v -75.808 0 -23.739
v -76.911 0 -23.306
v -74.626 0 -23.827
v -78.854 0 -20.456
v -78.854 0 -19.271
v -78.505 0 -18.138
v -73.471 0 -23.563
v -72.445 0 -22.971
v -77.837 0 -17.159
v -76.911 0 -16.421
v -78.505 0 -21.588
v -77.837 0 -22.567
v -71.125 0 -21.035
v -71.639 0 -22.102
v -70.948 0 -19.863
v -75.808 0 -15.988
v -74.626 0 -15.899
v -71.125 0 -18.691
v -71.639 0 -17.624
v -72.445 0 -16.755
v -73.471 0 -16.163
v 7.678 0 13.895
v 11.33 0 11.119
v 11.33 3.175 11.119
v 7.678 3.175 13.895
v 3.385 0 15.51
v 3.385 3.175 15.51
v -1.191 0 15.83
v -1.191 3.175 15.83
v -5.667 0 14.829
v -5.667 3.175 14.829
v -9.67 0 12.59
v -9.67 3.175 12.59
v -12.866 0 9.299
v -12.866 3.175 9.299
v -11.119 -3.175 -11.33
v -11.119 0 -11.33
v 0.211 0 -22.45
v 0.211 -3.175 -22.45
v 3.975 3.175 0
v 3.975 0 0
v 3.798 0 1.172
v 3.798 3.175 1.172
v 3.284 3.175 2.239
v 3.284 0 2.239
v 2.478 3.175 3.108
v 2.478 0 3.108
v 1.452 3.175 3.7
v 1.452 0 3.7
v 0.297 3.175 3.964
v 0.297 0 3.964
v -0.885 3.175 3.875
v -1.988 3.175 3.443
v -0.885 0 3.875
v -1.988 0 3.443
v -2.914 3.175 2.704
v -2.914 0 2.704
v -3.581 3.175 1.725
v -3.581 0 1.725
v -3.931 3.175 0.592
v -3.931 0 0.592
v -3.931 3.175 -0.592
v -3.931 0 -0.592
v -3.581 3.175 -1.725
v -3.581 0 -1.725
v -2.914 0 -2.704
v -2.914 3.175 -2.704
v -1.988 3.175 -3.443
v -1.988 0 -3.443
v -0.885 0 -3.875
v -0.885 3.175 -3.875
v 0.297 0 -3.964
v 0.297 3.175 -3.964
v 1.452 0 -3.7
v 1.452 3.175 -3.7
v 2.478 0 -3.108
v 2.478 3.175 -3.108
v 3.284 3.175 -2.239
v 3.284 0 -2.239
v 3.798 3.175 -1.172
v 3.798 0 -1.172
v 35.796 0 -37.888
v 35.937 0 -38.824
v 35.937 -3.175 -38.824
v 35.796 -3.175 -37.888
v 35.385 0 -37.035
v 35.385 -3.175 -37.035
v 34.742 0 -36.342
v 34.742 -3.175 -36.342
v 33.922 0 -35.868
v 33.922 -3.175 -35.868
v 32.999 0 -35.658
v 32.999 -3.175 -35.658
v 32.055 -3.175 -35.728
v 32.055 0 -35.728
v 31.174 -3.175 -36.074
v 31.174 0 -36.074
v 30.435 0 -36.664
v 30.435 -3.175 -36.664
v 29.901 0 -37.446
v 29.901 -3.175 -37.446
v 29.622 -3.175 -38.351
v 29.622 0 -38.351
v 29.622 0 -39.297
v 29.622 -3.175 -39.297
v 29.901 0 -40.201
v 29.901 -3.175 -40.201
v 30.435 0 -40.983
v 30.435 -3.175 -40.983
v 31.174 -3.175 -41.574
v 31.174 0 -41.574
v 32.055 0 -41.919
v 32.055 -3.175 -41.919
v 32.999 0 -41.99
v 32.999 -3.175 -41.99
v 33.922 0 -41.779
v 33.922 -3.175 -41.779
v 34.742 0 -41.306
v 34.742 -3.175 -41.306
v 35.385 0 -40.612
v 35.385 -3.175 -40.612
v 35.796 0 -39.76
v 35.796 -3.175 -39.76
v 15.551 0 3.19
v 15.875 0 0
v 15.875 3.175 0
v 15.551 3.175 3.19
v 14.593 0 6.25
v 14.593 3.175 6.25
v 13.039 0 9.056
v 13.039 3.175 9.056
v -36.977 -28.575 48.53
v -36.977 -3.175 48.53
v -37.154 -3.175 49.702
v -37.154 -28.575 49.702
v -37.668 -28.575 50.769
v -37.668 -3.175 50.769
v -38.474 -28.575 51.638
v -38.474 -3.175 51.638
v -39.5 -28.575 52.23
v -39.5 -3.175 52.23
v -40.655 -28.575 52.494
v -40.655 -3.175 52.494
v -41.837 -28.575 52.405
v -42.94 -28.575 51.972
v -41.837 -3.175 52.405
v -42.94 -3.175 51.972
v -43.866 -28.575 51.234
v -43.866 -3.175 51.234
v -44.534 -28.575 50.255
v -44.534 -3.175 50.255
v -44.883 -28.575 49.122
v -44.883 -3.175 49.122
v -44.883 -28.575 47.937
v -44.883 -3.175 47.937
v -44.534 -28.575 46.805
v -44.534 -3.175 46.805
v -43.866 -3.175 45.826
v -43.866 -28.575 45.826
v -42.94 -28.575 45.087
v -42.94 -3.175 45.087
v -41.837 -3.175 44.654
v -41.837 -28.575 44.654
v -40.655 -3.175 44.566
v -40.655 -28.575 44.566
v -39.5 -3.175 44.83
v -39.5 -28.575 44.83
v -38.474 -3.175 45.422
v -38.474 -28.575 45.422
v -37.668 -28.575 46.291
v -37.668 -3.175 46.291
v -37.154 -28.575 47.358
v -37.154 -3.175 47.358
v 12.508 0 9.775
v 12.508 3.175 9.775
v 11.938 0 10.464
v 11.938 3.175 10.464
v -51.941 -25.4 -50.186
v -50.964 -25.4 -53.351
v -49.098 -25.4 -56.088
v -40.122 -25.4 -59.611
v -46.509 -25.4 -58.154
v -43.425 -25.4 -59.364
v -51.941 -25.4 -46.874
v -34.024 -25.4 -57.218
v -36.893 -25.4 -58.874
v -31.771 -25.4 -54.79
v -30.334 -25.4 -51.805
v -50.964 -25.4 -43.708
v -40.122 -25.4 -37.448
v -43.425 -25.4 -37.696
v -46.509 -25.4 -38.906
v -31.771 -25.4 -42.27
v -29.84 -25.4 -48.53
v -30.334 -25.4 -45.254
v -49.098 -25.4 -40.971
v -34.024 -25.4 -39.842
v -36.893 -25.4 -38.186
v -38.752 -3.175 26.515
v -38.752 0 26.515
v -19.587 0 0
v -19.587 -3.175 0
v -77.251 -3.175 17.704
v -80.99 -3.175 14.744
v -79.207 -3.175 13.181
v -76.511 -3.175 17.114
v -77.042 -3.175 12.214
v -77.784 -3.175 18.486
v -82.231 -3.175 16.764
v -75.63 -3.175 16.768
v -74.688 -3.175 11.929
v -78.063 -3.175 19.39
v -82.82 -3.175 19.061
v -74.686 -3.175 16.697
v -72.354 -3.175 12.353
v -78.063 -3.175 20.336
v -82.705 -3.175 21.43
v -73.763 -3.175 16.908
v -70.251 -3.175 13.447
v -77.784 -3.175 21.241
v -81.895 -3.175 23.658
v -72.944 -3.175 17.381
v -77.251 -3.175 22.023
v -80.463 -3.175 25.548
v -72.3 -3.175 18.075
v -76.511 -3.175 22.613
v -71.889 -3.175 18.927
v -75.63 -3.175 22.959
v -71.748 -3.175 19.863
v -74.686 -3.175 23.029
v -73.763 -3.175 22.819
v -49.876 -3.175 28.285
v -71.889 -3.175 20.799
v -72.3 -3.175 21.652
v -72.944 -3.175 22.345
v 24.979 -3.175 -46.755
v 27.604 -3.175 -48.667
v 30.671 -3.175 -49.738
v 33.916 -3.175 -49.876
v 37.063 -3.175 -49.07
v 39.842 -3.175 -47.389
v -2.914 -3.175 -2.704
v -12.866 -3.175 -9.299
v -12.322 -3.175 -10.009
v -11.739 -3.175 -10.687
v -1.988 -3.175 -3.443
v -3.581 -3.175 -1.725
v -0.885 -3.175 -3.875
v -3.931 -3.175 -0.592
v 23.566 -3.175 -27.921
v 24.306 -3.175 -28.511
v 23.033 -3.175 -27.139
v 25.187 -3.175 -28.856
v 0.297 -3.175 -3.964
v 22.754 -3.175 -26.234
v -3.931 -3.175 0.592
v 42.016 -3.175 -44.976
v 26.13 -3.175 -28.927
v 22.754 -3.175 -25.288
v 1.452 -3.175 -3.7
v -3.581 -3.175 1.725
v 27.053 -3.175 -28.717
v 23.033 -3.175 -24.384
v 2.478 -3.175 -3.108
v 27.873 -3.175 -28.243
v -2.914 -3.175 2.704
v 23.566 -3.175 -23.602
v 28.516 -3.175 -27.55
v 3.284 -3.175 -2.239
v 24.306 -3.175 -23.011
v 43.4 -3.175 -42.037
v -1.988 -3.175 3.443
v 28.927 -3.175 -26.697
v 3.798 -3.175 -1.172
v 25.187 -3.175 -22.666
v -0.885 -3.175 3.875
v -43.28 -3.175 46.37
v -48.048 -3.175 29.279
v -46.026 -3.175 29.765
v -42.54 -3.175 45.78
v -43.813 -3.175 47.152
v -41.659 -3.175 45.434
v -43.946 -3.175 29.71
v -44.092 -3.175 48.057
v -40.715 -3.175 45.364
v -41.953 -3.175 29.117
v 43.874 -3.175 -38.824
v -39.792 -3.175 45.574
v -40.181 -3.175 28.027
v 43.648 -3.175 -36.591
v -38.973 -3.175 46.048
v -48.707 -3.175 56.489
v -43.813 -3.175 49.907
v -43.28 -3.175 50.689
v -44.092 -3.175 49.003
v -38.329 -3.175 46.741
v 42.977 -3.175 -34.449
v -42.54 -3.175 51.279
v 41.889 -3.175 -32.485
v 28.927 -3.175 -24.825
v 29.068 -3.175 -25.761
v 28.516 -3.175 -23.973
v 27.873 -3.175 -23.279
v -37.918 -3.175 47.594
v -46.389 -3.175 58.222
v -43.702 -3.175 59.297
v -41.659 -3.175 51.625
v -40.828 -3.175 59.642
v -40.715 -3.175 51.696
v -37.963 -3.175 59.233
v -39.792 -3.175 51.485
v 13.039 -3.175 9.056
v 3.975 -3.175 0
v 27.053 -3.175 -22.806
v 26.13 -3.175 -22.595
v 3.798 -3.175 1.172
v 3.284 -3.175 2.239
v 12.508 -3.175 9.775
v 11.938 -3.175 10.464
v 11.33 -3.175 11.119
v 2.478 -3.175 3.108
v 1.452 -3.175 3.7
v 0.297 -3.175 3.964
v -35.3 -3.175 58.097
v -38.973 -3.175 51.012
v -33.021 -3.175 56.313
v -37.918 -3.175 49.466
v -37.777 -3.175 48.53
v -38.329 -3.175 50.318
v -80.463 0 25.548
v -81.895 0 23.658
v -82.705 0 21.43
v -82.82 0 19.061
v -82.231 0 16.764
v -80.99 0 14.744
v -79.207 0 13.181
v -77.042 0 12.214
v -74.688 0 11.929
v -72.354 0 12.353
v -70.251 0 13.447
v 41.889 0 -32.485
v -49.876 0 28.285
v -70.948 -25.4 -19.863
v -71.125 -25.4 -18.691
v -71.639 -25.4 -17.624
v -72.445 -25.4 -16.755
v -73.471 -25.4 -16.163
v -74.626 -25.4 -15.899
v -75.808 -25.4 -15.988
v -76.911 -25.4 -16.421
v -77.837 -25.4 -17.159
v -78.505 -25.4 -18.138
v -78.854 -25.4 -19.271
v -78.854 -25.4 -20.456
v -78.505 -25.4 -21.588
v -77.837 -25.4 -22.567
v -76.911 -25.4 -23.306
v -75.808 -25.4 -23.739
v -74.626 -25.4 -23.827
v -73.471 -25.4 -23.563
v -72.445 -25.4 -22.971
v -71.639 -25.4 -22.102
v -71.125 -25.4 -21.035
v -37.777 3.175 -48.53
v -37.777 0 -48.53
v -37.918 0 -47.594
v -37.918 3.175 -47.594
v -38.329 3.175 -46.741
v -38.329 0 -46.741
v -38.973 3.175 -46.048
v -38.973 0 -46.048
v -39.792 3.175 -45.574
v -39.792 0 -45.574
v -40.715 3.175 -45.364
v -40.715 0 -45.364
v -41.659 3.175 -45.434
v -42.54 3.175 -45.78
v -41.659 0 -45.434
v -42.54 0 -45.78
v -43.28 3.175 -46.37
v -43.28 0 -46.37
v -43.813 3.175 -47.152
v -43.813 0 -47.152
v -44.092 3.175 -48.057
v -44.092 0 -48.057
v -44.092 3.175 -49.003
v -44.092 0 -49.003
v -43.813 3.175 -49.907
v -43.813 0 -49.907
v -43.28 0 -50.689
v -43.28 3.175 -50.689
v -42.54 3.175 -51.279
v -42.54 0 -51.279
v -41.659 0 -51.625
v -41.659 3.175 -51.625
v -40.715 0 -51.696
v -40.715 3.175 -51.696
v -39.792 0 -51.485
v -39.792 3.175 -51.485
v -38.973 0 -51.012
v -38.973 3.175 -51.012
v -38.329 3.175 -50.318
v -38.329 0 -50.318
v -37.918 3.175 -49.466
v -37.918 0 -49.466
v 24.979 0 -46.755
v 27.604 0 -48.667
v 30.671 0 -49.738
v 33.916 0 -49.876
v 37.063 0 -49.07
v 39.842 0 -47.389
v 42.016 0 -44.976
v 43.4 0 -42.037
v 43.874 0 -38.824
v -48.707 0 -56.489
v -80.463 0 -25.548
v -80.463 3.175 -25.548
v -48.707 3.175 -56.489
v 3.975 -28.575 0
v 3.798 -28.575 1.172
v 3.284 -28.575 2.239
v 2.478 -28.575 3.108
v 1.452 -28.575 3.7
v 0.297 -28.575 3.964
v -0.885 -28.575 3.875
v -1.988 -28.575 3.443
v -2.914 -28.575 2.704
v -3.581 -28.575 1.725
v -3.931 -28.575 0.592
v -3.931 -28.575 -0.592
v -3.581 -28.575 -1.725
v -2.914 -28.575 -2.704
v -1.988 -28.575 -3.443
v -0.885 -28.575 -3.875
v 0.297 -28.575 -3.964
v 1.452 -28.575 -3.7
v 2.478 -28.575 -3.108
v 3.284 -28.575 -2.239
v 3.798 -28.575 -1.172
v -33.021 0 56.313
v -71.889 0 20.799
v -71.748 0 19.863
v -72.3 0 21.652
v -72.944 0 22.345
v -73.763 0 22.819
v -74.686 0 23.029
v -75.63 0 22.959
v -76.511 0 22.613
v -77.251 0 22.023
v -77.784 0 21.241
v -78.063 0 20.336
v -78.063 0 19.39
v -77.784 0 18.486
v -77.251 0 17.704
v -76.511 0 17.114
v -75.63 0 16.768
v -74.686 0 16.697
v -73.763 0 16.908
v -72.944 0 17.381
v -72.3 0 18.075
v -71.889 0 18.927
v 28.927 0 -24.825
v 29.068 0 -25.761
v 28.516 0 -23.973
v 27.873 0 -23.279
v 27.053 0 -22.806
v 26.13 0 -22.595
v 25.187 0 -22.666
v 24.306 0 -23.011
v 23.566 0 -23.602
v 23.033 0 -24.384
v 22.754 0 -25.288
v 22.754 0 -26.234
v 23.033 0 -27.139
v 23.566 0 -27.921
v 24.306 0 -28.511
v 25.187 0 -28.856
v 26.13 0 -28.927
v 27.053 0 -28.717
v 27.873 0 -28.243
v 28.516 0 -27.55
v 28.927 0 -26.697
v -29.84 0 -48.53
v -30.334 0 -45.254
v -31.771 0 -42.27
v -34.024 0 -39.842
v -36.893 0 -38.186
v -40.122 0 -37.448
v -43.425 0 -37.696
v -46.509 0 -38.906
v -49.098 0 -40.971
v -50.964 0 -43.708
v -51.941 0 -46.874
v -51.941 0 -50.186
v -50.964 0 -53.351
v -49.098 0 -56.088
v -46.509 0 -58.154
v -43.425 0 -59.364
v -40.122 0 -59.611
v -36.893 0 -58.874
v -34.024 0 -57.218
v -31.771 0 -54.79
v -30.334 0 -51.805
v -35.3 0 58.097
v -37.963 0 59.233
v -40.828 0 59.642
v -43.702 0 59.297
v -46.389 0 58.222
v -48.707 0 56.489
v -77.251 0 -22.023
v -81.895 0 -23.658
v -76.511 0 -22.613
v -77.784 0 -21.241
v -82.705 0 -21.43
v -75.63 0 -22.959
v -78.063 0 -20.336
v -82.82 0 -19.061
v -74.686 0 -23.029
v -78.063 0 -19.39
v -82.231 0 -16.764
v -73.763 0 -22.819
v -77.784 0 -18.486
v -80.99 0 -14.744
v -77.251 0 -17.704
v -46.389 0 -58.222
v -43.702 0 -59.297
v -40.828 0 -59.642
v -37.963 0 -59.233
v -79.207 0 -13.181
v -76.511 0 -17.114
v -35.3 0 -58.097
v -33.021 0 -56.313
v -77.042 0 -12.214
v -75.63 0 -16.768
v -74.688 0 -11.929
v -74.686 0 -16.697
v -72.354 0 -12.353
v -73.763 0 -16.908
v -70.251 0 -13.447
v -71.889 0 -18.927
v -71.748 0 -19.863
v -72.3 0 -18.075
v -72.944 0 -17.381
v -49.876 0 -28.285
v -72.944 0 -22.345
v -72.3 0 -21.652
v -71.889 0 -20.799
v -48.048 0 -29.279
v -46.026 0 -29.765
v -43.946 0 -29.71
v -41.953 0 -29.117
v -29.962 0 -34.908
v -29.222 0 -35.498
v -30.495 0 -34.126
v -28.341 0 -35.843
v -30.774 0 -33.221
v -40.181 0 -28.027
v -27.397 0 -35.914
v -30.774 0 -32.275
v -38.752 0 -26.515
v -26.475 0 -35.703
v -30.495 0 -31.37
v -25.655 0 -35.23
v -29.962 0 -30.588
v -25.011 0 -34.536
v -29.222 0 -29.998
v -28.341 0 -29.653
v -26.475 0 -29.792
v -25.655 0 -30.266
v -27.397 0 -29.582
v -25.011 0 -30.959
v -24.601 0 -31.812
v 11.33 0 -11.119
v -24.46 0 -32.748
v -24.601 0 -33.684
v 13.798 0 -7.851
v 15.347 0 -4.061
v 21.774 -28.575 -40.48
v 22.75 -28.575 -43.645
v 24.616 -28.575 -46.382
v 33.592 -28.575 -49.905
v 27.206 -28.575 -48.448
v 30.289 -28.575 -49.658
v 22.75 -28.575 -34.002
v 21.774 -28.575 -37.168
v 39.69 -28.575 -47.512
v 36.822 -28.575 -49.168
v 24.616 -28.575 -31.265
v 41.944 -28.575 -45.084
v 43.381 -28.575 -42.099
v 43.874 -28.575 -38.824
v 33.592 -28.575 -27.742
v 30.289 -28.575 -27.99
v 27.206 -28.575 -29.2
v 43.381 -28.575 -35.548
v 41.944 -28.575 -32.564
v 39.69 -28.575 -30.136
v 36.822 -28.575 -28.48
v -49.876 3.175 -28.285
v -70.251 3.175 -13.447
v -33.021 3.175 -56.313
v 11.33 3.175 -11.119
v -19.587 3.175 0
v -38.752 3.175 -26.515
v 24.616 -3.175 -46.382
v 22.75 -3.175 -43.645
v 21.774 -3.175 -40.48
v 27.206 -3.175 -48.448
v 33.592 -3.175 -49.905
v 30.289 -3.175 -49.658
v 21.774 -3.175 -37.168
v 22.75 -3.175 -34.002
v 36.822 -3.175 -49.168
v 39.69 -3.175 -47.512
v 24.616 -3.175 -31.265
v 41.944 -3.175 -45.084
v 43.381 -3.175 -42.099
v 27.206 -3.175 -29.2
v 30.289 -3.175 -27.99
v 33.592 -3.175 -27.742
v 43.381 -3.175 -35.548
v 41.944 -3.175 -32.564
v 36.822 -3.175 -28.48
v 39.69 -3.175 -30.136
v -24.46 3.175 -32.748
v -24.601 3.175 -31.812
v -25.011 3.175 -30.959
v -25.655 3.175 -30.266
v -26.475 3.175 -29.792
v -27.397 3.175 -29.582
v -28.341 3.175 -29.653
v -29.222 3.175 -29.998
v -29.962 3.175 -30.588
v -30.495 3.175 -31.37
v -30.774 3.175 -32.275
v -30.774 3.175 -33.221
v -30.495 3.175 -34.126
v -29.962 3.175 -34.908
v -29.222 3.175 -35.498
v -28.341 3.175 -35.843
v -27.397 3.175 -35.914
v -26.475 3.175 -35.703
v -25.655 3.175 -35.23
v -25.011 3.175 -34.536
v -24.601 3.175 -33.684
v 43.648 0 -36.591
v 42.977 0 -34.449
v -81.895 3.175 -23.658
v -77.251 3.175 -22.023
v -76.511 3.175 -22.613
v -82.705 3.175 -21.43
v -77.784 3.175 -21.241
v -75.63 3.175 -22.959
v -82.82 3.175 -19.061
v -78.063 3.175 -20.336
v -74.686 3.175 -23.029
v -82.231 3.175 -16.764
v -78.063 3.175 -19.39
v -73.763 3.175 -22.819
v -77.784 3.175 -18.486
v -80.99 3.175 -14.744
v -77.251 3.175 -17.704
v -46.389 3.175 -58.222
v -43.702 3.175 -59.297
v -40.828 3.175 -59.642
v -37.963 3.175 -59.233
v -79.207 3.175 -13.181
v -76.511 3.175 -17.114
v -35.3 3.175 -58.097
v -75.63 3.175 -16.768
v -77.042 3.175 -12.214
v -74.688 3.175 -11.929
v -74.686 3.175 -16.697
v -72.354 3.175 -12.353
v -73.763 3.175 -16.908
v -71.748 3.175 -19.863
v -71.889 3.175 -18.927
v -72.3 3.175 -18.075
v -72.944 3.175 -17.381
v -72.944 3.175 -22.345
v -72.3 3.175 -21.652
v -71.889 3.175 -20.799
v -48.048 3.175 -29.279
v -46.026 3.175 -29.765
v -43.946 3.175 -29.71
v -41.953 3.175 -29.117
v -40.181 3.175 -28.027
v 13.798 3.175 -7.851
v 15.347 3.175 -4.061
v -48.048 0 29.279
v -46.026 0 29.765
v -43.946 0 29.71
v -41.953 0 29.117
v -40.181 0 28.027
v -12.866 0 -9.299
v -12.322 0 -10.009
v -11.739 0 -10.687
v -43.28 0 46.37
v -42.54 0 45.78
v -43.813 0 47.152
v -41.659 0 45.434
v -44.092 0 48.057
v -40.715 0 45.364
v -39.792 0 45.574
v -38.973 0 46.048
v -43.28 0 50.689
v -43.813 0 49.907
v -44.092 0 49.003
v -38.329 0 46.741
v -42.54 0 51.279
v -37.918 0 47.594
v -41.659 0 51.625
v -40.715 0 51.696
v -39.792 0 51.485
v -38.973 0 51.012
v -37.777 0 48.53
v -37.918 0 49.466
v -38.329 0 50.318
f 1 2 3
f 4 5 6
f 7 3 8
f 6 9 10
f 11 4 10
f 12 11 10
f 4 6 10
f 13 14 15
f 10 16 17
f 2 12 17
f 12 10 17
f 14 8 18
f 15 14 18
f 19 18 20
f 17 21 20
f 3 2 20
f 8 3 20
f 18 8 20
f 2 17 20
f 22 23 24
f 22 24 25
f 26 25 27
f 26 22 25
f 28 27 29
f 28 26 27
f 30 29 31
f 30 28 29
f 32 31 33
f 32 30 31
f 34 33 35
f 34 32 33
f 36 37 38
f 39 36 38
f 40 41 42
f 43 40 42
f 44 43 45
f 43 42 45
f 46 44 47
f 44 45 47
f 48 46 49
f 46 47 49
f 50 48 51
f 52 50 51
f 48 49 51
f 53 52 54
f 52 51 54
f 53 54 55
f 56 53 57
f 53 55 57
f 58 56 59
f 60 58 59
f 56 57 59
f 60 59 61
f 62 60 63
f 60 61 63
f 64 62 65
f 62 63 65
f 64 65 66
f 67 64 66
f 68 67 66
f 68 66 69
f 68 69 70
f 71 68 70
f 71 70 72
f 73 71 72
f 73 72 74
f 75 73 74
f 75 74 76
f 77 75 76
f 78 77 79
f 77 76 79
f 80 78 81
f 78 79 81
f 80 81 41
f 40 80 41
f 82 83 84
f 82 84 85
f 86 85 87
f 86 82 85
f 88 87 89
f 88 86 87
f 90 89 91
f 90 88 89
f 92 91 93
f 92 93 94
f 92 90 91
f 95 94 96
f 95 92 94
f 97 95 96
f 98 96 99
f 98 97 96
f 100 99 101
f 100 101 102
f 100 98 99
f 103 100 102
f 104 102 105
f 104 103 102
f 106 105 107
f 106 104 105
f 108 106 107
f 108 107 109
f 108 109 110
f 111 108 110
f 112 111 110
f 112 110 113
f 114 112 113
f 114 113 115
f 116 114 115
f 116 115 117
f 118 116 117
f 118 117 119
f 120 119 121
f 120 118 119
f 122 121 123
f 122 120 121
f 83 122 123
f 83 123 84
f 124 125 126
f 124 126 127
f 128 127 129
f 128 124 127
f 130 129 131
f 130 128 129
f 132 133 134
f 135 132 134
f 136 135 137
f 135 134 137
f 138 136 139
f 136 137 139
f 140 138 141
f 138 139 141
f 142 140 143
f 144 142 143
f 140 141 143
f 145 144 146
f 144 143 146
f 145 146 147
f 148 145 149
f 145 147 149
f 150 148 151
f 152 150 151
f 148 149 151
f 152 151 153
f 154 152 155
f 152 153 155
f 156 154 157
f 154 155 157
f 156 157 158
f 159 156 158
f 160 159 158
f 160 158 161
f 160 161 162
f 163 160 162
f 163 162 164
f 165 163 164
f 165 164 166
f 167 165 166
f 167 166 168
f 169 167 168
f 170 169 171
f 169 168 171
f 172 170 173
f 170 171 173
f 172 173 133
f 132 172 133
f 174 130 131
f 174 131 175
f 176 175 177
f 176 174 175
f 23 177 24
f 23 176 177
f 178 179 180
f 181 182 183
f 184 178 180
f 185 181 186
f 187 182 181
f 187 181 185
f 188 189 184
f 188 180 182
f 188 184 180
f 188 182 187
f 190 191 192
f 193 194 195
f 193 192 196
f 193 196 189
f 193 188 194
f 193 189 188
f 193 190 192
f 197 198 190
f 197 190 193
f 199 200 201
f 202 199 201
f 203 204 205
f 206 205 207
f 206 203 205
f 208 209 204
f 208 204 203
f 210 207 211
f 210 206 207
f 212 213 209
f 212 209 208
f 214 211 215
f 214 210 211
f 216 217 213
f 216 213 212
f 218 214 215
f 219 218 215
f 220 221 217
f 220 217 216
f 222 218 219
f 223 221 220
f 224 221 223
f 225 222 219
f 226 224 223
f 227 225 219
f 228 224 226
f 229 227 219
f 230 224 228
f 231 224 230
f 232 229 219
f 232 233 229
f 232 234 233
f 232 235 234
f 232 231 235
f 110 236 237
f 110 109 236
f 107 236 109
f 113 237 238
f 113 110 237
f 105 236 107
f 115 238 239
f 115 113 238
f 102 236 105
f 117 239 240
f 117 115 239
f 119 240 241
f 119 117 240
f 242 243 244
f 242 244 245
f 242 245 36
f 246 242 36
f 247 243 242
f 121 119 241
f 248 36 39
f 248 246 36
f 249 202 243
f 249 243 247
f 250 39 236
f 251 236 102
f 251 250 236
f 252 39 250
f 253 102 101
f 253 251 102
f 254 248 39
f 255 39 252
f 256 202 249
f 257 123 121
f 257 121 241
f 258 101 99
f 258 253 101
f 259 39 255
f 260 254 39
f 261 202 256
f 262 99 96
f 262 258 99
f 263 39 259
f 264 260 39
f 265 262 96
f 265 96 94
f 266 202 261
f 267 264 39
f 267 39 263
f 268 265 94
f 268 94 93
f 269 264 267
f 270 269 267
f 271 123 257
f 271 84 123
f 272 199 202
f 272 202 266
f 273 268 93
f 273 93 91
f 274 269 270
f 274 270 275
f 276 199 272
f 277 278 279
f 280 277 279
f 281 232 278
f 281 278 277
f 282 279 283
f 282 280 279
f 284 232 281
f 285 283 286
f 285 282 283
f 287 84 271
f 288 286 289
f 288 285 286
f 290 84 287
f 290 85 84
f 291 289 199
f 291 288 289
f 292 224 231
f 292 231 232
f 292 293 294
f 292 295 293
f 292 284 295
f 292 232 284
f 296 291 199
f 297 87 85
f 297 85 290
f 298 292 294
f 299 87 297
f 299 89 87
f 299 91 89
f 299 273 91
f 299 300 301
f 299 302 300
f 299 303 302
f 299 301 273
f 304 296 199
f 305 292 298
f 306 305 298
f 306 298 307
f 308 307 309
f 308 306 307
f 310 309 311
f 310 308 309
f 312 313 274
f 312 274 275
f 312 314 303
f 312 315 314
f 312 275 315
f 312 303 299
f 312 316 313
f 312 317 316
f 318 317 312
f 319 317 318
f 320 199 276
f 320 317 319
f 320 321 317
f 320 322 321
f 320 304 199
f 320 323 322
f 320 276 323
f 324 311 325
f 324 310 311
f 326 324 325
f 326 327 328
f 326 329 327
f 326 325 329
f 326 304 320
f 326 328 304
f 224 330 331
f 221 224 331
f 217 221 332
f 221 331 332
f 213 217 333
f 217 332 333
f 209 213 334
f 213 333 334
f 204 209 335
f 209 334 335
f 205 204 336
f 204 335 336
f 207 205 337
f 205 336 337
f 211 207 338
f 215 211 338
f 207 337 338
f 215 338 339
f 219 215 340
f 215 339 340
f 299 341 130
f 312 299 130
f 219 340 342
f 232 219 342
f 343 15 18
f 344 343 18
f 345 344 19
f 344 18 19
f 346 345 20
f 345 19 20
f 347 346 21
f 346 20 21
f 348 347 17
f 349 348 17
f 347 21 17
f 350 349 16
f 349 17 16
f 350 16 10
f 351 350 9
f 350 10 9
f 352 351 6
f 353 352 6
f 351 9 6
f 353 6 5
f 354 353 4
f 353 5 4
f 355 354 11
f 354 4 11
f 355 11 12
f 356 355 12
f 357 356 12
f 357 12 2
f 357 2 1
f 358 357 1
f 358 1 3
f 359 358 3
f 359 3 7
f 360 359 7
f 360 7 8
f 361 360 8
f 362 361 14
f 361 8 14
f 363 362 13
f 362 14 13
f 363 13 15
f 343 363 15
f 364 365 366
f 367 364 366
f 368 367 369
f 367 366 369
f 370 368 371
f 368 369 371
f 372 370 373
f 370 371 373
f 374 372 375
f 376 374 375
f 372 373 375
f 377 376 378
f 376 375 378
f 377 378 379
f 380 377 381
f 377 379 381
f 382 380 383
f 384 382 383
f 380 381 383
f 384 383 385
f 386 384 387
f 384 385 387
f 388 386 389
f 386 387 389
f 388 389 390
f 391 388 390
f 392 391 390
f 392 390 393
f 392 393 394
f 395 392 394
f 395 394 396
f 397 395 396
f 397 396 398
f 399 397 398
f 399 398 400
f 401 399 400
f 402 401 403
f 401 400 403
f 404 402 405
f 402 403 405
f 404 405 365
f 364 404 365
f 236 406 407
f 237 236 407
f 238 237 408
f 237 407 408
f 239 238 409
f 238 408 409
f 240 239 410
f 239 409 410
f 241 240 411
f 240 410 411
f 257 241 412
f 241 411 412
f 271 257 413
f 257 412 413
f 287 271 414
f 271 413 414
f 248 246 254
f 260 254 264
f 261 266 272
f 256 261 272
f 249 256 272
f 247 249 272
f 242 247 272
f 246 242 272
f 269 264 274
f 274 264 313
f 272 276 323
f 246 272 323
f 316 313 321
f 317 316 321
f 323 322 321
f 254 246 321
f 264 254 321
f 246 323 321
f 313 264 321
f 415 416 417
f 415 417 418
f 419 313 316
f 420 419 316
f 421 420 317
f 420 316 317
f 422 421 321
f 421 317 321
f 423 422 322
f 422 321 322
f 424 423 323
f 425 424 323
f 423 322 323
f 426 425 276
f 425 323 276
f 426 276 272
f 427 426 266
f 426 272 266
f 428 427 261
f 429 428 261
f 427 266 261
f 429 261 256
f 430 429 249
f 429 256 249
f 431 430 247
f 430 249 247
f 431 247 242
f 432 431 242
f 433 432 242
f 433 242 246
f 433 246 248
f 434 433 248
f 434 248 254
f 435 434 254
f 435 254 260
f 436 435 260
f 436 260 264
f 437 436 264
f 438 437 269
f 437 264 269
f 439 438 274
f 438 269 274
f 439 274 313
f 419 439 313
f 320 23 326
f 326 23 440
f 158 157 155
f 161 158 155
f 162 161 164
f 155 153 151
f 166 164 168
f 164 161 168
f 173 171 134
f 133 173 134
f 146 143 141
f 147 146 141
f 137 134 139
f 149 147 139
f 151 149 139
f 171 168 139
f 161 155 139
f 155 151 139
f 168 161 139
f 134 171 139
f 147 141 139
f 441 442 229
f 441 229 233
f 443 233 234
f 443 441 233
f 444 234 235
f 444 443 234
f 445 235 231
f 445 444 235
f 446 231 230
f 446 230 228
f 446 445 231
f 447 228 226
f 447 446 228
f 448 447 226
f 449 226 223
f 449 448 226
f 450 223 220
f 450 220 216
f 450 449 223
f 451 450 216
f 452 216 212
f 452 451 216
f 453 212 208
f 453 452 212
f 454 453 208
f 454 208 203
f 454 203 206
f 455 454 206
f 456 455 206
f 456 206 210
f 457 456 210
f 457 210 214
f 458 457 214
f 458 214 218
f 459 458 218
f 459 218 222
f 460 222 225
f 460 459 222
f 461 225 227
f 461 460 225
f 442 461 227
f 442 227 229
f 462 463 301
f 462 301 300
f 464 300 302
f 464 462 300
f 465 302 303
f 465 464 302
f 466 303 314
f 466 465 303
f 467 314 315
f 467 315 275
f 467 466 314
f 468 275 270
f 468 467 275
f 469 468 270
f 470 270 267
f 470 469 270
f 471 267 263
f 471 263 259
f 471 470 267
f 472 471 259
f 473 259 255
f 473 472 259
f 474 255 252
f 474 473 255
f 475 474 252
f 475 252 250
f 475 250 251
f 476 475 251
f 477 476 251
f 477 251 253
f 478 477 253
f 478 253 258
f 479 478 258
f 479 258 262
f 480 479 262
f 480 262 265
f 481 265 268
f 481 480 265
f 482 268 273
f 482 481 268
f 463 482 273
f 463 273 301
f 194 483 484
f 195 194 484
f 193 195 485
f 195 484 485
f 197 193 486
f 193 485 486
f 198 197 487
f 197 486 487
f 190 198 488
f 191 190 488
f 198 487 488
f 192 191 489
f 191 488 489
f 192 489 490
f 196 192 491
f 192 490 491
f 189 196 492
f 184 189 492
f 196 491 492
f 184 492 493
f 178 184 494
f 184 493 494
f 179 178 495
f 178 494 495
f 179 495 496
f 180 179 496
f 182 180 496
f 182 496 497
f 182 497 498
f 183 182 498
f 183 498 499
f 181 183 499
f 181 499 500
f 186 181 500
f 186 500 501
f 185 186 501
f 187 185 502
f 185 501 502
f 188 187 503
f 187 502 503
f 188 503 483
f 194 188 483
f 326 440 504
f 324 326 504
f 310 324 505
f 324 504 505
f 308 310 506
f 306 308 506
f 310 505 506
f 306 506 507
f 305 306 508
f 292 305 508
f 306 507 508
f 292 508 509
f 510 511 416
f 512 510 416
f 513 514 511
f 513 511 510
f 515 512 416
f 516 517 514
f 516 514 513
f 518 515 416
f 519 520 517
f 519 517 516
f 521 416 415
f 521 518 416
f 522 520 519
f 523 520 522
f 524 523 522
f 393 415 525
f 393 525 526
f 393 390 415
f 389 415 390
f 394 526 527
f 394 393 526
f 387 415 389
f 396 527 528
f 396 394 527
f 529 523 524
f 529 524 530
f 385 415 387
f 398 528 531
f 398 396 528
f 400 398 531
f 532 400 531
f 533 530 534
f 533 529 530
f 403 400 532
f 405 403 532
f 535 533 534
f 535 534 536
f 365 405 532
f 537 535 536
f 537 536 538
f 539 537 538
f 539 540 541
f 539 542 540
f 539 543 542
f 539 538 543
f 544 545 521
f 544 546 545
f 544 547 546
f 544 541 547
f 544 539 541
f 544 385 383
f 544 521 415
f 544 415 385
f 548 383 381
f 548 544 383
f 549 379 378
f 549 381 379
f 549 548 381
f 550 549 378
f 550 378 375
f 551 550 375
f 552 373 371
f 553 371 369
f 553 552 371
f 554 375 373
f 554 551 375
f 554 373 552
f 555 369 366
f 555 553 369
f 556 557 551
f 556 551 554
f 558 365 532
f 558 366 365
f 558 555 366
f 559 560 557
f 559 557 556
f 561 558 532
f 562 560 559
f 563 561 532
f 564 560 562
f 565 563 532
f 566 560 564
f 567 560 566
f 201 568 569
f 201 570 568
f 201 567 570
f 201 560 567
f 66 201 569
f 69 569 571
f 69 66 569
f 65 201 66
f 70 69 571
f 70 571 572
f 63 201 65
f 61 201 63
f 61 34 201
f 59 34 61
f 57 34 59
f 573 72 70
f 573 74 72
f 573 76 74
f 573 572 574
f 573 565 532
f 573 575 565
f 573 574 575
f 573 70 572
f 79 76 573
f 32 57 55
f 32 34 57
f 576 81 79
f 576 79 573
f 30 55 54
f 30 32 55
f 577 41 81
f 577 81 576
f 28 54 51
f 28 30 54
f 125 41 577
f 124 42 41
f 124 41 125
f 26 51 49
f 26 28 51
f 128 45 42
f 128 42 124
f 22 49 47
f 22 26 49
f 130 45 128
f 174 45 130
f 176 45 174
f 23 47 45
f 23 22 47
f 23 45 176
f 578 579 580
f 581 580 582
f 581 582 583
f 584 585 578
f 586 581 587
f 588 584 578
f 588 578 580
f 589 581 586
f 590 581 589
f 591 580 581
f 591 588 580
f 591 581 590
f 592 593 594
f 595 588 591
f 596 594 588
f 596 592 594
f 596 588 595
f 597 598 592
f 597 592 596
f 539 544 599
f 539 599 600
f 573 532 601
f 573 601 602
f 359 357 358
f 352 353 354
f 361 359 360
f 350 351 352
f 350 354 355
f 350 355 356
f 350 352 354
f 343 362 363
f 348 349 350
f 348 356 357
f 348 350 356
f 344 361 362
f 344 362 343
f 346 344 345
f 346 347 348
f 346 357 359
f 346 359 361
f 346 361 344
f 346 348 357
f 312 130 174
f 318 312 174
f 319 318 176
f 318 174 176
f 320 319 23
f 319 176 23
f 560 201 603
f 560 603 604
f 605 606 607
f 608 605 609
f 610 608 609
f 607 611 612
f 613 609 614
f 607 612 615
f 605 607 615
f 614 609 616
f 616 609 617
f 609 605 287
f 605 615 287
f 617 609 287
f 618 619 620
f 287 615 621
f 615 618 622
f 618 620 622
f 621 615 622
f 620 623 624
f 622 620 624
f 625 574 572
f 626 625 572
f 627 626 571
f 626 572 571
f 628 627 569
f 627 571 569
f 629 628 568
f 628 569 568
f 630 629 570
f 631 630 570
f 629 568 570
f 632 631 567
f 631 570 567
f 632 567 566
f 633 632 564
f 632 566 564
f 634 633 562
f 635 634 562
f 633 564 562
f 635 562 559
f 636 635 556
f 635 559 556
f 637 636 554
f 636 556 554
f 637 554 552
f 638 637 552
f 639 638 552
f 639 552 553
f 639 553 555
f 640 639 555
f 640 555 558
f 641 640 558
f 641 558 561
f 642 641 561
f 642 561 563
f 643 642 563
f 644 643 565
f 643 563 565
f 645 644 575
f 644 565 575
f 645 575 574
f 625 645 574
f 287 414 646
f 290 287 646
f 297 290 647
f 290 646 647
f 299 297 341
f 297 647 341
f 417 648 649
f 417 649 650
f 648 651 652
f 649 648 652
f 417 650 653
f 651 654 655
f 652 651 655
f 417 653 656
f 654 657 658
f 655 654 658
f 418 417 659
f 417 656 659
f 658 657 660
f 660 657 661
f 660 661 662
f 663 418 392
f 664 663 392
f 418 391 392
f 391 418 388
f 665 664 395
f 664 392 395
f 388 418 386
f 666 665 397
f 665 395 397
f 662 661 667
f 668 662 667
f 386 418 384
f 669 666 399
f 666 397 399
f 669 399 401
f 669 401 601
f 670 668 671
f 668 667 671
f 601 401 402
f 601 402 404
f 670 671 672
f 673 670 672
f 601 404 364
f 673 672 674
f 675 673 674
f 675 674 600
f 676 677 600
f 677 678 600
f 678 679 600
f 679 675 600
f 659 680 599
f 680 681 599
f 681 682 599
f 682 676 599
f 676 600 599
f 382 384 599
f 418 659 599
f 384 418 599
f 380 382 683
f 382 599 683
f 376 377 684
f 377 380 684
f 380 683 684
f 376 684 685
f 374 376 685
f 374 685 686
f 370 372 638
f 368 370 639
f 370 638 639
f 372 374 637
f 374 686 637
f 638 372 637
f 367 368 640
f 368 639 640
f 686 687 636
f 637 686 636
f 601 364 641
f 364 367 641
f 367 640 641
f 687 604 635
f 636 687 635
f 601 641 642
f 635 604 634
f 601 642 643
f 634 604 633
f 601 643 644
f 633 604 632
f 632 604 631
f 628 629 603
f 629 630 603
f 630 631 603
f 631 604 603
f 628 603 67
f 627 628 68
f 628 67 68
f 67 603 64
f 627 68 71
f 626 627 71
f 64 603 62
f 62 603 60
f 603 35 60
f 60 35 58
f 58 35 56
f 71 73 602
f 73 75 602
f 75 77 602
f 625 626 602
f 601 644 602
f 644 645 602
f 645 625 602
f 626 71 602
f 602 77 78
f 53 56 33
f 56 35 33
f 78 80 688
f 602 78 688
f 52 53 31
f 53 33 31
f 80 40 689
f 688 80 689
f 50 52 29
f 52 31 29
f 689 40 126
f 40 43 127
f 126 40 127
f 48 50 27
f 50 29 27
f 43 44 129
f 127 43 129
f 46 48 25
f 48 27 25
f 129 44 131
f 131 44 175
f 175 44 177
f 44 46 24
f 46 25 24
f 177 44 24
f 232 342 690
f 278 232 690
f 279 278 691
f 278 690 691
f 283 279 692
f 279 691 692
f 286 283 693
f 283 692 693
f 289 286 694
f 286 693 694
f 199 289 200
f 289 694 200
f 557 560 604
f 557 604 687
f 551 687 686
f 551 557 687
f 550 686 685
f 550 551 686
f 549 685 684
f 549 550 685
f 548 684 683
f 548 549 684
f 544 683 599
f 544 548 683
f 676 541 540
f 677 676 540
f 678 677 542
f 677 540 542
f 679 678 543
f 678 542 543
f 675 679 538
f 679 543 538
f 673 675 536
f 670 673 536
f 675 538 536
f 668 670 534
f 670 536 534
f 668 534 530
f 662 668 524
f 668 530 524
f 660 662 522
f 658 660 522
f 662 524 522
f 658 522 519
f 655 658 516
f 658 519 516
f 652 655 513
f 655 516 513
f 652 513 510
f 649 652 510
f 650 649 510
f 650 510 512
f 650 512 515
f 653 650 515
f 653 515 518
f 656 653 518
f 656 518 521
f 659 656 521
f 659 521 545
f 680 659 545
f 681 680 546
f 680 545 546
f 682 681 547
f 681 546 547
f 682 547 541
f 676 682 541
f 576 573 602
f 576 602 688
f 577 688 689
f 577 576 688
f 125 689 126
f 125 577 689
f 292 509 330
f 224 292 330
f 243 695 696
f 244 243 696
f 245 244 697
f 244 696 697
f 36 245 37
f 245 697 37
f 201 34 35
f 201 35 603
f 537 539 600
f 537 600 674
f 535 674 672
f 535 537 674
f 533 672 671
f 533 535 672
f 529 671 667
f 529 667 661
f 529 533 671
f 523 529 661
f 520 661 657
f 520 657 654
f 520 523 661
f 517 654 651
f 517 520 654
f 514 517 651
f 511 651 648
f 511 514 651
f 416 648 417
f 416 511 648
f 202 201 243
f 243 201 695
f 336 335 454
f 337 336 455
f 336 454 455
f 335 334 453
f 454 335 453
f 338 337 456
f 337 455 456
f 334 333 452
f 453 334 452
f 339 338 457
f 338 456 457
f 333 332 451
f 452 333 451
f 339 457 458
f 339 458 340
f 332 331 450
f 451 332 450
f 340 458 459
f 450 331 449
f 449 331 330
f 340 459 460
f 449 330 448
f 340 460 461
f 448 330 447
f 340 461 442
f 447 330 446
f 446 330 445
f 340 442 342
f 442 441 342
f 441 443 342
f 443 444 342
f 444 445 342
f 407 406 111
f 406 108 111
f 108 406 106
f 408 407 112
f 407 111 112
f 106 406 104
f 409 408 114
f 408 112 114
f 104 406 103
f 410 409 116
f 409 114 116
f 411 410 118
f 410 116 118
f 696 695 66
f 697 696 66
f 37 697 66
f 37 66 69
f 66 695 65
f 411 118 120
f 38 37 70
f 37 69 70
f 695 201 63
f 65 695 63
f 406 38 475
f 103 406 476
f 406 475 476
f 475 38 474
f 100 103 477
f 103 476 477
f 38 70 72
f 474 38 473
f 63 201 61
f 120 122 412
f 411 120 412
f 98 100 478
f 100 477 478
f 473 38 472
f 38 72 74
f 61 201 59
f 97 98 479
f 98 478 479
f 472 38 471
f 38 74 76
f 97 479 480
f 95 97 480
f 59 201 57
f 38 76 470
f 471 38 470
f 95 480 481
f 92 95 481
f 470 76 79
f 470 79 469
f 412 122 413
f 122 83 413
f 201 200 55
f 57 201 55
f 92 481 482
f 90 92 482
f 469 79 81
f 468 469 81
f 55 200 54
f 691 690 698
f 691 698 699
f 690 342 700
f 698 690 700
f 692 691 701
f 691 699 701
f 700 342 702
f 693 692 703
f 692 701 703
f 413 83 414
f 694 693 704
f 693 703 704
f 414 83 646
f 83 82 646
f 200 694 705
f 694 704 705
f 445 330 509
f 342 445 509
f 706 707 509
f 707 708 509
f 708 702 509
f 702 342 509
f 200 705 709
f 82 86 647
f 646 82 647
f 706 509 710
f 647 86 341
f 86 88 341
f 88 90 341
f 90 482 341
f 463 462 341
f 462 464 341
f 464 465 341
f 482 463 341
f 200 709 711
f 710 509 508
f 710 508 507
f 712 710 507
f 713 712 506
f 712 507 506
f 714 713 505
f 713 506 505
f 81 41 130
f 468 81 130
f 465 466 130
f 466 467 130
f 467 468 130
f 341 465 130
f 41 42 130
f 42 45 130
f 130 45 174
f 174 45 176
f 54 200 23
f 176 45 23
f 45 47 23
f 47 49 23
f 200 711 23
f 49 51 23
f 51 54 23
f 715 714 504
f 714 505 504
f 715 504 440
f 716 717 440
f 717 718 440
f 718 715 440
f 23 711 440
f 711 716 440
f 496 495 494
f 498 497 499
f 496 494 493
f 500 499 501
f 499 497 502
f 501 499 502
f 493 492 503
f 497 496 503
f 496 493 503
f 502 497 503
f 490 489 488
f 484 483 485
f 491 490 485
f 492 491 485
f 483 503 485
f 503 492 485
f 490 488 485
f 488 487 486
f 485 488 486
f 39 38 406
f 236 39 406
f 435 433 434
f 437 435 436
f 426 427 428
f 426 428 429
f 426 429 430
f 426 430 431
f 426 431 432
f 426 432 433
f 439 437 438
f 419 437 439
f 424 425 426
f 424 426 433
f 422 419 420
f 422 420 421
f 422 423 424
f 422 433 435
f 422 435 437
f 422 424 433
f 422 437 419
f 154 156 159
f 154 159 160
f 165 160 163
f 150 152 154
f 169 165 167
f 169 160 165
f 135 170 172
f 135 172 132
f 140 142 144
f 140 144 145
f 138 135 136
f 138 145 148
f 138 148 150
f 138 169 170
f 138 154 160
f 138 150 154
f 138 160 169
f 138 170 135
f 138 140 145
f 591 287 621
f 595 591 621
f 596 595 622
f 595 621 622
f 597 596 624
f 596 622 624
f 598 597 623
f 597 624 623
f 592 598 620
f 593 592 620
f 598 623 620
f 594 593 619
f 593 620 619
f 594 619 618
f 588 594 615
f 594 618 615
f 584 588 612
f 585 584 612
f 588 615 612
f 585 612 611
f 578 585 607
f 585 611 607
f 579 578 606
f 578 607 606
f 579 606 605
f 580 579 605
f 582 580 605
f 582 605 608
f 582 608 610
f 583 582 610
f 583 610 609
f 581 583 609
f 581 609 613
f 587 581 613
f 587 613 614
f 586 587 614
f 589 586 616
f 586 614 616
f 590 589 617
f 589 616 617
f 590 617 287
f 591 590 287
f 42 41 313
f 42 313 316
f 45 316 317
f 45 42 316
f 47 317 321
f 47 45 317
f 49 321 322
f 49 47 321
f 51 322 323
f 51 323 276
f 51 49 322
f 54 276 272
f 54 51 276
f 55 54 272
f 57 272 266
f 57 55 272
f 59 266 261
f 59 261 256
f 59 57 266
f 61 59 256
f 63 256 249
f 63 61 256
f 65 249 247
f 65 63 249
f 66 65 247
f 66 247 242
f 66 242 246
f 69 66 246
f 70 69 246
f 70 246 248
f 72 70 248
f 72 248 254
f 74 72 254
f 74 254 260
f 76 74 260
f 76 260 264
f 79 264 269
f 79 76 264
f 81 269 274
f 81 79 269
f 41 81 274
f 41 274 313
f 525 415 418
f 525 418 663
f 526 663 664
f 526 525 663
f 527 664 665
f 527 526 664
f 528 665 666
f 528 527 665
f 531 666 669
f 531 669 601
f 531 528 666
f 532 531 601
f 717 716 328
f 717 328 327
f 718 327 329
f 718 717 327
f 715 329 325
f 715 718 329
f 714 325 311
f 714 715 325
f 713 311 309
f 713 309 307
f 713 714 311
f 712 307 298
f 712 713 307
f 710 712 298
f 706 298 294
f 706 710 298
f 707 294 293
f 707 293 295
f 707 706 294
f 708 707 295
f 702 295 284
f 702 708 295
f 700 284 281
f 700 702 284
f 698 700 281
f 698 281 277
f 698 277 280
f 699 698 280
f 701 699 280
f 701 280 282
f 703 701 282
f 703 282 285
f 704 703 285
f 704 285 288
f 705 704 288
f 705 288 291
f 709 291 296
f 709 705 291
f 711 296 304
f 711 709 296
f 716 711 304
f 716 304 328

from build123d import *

# Parameters (mm, degrees)
F0_R     = 3.175
F0_R_2   = 3.9751
F1_DEPTH = 3.175
F2_DEPTH = 3.175
F3_R     = 3.9751
F5_DEPTH = 25.4
F3_R_2   = 11.1125
F4_R     = 11.1125
F4_R_2   = 3.9751


with BuildPart() as f1:
    # F0 (on Front) → F1 (new body)
    with BuildSketch(Plane.XZ):
        with BuildLine():
            ThreePointArc((-66.9858438501, 19.8631580146), (-71.8382297424, 27.1765687915), (-80.4626255048, 25.5482494826))
            ThreePointArc((-80.4626255048, 25.5482494826), (-80.9895769634, 14.7441032126), (-70.2506669259, 13.4467730034))
            ThreePointArc((-70.2506669259, 13.4467730034), (-67.8489788844, 16.263537676), (-66.9858438501, 19.8631580146))
        make_face()
        with Locations((-74.9233438501, 19.8631580146)):
            Circle(F0_R, mode=Mode.SUBTRACT)
        with BuildLine():
            ThreePointArc((-12.8661537652, 9.299339347), (-1.190625, 15.8302885984), (11.3304373246, 11.1192092809))
            Line((11.3304373246, 11.1192092809), (-33.0211322888, 56.3133114025))
            ThreePointArc((-33.0211322888, 56.3133114025), (-30.6659352301, 52.7340899778), (-29.8399384161, 48.5298649058))
            ThreePointArc((-29.8399384161, 48.5298649058), (-45.2715981669, 38.2910898181), (-48.7074327326, 56.4889929611))
            Line((-48.7074327326, 56.4889929611), (-80.4626255048, 25.5482494826))
            ThreePointArc((-80.4626255048, 25.5482494826), (-71.8382297424, 27.1765687915), (-66.9858438501, 19.8631580146))
            ThreePointArc((-66.9858438501, 19.8631580146), (-67.8489788844, 16.263537676), (-70.2506669259, 13.4467730034))
            Line((-70.2506669259, 13.4467730034), (-49.875562384, 28.2847667734))
            ThreePointArc((-49.875562384, 28.2847667734), (-43.9463883649, 29.7095884686), (-38.7520393711, 26.5152246911))
            Line((-38.7520393711, 26.5152246911), (-19.5874874185, 0))
            Line((-19.5874874185, 0), (-12.8661537652, 9.299339347))
        make_face()
        with BuildLine():
            ThreePointArc((-29.8399384161, 48.5298649058), (-30.6659352301, 52.7340899778), (-33.0211322888, 56.3133114025))
            ThreePointArc((-33.0211322888, 56.3133114025), (-40.8279897674, 59.6416680351), (-48.7074327326, 56.4889929611))
            ThreePointArc((-48.7074327326, 56.4889929611), (-45.2715981669, 38.2910898181), (-29.8399384161, 48.5298649058))
        make_face()
        with Locations((-40.9524384161, 48.5298649058)):
            Circle(F0_R, mode=Mode.SUBTRACT)
        with BuildLine():
            ThreePointArc((11.3304373246, -11.1192092809), (14.6950045513, -6.0060358171), (15.875, 0))
            ThreePointArc((15.875, 0), (15.1493802753, 4.7446709342), (13.0388548317, 9.0555999071))
            ThreePointArc((13.0388548317, 9.0555999071), (12.2282550252, 10.1235074968), (11.3304373246, 11.1192092809))
            ThreePointArc((11.3304373246, 11.1192092809), (-1.190625, 15.8302885984), (-12.8661537652, 9.299339347))
            ThreePointArc((-12.8661537652, 9.299339347), (-15.875, 0), (-12.8661537652, -9.299339347))
            ThreePointArc((-12.8661537652, -9.299339347), (-12.0356034274, -10.3518054047), (-11.1192092809, -11.3304373246))
            ThreePointArc((-11.1192092809, -11.3304373246), (0.1493607821, -15.87429735), (11.3304373246, -11.1192092809))
        make_face()
        Circle(F0_R_2, mode=Mode.SUBTRACT)
        with BuildLine():
            ThreePointArc((13.0388548317, 9.0555999071), (15.1493802753, 4.7446709342), (15.875, 0))
            ThreePointArc((15.875, 0), (14.6950045513, -6.0060358171), (11.3304373246, -11.1192092809))
            Line((11.3304373246, -11.1192092809), (0.2112280437, -22.4496466055))
            Line((0.2112280437, -22.4496466055), (24.9785042362, -46.7551980519))
            ThreePointArc((24.9785042362, -46.7551980519), (25.59527401, -30.3311655661), (41.889149115, -32.4849719897))
            Line((41.889149115, -32.4849719897), (13.0388548317, 9.0555999071))
        make_face()
        with Locations((25.8931709816, -25.7610933689)):
            Circle(F0_R, mode=Mode.SUBTRACT)
        with BuildLine():
            ThreePointArc((43.8744507328, -38.8238919247), (43.3665169256, -35.5026222708), (41.889149115, -32.4849719897))
            ThreePointArc((41.889149115, -32.4849719897), (25.59527401, -30.3311655661), (24.9785042362, -46.7551980519))
            ThreePointArc((24.9785042362, -46.7551980519), (37.0627708323, -49.0703841402), (43.8744507328, -38.8238919247))
        make_face()
        with Locations((32.7619507328, -38.8238919247)):
            Circle(F0_R, mode=Mode.SUBTRACT)
        with BuildLine():
            ThreePointArc((-12.8661537652, -9.299339347), (-15.875, 0), (-12.8661537652, 9.299339347))
            Line((-12.8661537652, 9.299339347), (-19.5874874185, 0))
            Line((-19.5874874185, 0), (-12.8661537652, -9.299339347))
        make_face()
        with BuildLine():
            Line((0.2112280437, -22.4496466055), (11.3304373246, -11.1192092809))
            ThreePointArc((11.3304373246, -11.1192092809), (0.1493607821, -15.87429735), (-11.1192092809, -11.3304373246))
            Line((-11.1192092809, -11.3304373246), (0.2112280437, -22.4496466055))
        make_face()
    extrude(amount=F1_DEPTH)


with BuildPart() as f2:
    # F0 (on Front) → F2 (new body)
    with BuildSketch(Plane.XZ):
        with BuildLine():
            ThreePointArc((-70.2506669259, -13.4467730034), (-80.9895769634, -14.7441032126), (-80.4626255048, -25.5482494826))
            ThreePointArc((-80.4626255048, -25.5482494826), (-71.8382297424, -27.1765687915), (-66.9858438501, -19.8631580146))
            ThreePointArc((-66.9858438501, -19.8631580146), (-67.8489788844, -16.263537676), (-70.2506669259, -13.4467730034))
        make_face()
        with Locations((-74.9233438501, -19.8631580146)):
            Circle(F0_R, mode=Mode.SUBTRACT)
        with BuildLine():
            Line((0.2112280437, -22.4496466055), (-11.1192092809, -11.3304373246))
            ThreePointArc((-11.1192092809, -11.3304373246), (-12.0356034274, -10.3518054047), (-12.8661537652, -9.299339347))
            Line((-12.8661537652, -9.299339347), (-19.5874874185, 0))
            Line((-19.5874874185, 0), (-38.7520393711, -26.5152246911))
            ThreePointArc((-38.7520393711, -26.5152246911), (-43.9463883649, -29.7095884686), (-49.875562384, -28.2847667734))
            Line((-49.875562384, -28.2847667734), (-70.2506669259, -13.4467730034))
            ThreePointArc((-70.2506669259, -13.4467730034), (-67.8489788844, -16.263537676), (-66.9858438501, -19.8631580146))
            ThreePointArc((-66.9858438501, -19.8631580146), (-71.8382297424, -27.1765687915), (-80.4626255048, -25.5482494826))
            Line((-80.4626255048, -25.5482494826), (-48.7074327326, -56.4889929611))
            ThreePointArc((-48.7074327326, -56.4889929611), (-45.2715981669, -38.2910898181), (-29.8399384161, -48.5298649058))
            ThreePointArc((-29.8399384161, -48.5298649058), (-30.6659352301, -52.7340899778), (-33.0211322888, -56.3133114025))
            Line((-33.0211322888, -56.3133114025), (0.2112280437, -22.4496466055))
        make_face()
        with Locations((-27.6347054432, -32.7479528385)):
            Circle(F0_R, mode=Mode.SUBTRACT)
        with BuildLine():
            ThreePointArc((11.3304373246, -11.1192092809), (14.6950045513, -6.0060358171), (15.875, 0))
            ThreePointArc((15.875, 0), (15.1493802753, 4.7446709342), (13.0388548317, 9.0555999071))
            ThreePointArc((13.0388548317, 9.0555999071), (12.2282550252, 10.1235074968), (11.3304373246, 11.1192092809))
            ThreePointArc((11.3304373246, 11.1192092809), (-1.190625, 15.8302885984), (-12.8661537652, 9.299339347))
            ThreePointArc((-12.8661537652, 9.299339347), (-15.875, 0), (-12.8661537652, -9.299339347))
            ThreePointArc((-12.8661537652, -9.299339347), (-12.0356034274, -10.3518054047), (-11.1192092809, -11.3304373246))
            ThreePointArc((-11.1192092809, -11.3304373246), (0.1493607821, -15.87429735), (11.3304373246, -11.1192092809))
        make_face()
        Circle(F0_R_2, mode=Mode.SUBTRACT)
        with BuildLine():
            Line((0.2112280437, -22.4496466055), (11.3304373246, -11.1192092809))
            ThreePointArc((11.3304373246, -11.1192092809), (0.1493607821, -15.87429735), (-11.1192092809, -11.3304373246))
            Line((-11.1192092809, -11.3304373246), (0.2112280437, -22.4496466055))
        make_face()
        with BuildLine():
            ThreePointArc((-12.8661537652, -9.299339347), (-15.875, 0), (-12.8661537652, 9.299339347))
            Line((-12.8661537652, 9.299339347), (-19.5874874185, 0))
            Line((-19.5874874185, 0), (-12.8661537652, -9.299339347))
        make_face()
        with BuildLine():
            ThreePointArc((-48.7074327326, -56.4889929611), (-40.8279897674, -59.6416680351), (-33.0211322888, -56.3133114025))
            ThreePointArc((-33.0211322888, -56.3133114025), (-30.6659352301, -52.7340899778), (-29.8399384161, -48.5298649058))
            ThreePointArc((-29.8399384161, -48.5298649058), (-45.2715981669, -38.2910898181), (-48.7074327326, -56.4889929611))
        make_face()
        with Locations((-40.9524384161, -48.5298649058)):
            Circle(F0_R, mode=Mode.SUBTRACT)
    extrude(amount=-F2_DEPTH)


with BuildPart() as f5:
    # F3 (on face) → F5 (new body)
    with BuildSketch(Plane.XZ.offset(3.175)):
        Circle(F3_R)
    extrude(amount=F5_DEPTH)


with BuildPart() as f5b:
    # F3 (on face) → F5, piece 2 (new body)
    with BuildSketch(Plane.XZ.offset(3.175)):
        with Locations((32.7619507328, -38.8238919247)):
            Circle(F3_R_2)
    extrude(amount=F5_DEPTH)


with BuildPart() as f5c:
    # F3 (on face) → F5, piece 3 (new body)
    with BuildSketch(Plane.XZ.offset(3.175)):
        with Locations((-40.9524384161, 48.5298649058)):
            Circle(F3_R)
    extrude(amount=F5_DEPTH)


with BuildPart() as f5d:
    # F4 (on face) → F5, piece 4 (new body)
    with BuildSketch(Plane.XZ):
        with Locations((-40.9524384161, -48.5298649058)):
            Circle(F4_R)
    extrude(amount=F5_DEPTH)


with BuildPart() as f5e:
    # F4 (on face) → F5, piece 5 (new body)
    with BuildSketch(Plane.XZ):
        with Locations((-74.9233438501, -19.8631580146)):
            Circle(F4_R_2)
    extrude(amount=F5_DEPTH)


solid = Compound([f1.part, f2.part, f5.part, f5b.part, f5c.part, f5d.part, f5e.part])
